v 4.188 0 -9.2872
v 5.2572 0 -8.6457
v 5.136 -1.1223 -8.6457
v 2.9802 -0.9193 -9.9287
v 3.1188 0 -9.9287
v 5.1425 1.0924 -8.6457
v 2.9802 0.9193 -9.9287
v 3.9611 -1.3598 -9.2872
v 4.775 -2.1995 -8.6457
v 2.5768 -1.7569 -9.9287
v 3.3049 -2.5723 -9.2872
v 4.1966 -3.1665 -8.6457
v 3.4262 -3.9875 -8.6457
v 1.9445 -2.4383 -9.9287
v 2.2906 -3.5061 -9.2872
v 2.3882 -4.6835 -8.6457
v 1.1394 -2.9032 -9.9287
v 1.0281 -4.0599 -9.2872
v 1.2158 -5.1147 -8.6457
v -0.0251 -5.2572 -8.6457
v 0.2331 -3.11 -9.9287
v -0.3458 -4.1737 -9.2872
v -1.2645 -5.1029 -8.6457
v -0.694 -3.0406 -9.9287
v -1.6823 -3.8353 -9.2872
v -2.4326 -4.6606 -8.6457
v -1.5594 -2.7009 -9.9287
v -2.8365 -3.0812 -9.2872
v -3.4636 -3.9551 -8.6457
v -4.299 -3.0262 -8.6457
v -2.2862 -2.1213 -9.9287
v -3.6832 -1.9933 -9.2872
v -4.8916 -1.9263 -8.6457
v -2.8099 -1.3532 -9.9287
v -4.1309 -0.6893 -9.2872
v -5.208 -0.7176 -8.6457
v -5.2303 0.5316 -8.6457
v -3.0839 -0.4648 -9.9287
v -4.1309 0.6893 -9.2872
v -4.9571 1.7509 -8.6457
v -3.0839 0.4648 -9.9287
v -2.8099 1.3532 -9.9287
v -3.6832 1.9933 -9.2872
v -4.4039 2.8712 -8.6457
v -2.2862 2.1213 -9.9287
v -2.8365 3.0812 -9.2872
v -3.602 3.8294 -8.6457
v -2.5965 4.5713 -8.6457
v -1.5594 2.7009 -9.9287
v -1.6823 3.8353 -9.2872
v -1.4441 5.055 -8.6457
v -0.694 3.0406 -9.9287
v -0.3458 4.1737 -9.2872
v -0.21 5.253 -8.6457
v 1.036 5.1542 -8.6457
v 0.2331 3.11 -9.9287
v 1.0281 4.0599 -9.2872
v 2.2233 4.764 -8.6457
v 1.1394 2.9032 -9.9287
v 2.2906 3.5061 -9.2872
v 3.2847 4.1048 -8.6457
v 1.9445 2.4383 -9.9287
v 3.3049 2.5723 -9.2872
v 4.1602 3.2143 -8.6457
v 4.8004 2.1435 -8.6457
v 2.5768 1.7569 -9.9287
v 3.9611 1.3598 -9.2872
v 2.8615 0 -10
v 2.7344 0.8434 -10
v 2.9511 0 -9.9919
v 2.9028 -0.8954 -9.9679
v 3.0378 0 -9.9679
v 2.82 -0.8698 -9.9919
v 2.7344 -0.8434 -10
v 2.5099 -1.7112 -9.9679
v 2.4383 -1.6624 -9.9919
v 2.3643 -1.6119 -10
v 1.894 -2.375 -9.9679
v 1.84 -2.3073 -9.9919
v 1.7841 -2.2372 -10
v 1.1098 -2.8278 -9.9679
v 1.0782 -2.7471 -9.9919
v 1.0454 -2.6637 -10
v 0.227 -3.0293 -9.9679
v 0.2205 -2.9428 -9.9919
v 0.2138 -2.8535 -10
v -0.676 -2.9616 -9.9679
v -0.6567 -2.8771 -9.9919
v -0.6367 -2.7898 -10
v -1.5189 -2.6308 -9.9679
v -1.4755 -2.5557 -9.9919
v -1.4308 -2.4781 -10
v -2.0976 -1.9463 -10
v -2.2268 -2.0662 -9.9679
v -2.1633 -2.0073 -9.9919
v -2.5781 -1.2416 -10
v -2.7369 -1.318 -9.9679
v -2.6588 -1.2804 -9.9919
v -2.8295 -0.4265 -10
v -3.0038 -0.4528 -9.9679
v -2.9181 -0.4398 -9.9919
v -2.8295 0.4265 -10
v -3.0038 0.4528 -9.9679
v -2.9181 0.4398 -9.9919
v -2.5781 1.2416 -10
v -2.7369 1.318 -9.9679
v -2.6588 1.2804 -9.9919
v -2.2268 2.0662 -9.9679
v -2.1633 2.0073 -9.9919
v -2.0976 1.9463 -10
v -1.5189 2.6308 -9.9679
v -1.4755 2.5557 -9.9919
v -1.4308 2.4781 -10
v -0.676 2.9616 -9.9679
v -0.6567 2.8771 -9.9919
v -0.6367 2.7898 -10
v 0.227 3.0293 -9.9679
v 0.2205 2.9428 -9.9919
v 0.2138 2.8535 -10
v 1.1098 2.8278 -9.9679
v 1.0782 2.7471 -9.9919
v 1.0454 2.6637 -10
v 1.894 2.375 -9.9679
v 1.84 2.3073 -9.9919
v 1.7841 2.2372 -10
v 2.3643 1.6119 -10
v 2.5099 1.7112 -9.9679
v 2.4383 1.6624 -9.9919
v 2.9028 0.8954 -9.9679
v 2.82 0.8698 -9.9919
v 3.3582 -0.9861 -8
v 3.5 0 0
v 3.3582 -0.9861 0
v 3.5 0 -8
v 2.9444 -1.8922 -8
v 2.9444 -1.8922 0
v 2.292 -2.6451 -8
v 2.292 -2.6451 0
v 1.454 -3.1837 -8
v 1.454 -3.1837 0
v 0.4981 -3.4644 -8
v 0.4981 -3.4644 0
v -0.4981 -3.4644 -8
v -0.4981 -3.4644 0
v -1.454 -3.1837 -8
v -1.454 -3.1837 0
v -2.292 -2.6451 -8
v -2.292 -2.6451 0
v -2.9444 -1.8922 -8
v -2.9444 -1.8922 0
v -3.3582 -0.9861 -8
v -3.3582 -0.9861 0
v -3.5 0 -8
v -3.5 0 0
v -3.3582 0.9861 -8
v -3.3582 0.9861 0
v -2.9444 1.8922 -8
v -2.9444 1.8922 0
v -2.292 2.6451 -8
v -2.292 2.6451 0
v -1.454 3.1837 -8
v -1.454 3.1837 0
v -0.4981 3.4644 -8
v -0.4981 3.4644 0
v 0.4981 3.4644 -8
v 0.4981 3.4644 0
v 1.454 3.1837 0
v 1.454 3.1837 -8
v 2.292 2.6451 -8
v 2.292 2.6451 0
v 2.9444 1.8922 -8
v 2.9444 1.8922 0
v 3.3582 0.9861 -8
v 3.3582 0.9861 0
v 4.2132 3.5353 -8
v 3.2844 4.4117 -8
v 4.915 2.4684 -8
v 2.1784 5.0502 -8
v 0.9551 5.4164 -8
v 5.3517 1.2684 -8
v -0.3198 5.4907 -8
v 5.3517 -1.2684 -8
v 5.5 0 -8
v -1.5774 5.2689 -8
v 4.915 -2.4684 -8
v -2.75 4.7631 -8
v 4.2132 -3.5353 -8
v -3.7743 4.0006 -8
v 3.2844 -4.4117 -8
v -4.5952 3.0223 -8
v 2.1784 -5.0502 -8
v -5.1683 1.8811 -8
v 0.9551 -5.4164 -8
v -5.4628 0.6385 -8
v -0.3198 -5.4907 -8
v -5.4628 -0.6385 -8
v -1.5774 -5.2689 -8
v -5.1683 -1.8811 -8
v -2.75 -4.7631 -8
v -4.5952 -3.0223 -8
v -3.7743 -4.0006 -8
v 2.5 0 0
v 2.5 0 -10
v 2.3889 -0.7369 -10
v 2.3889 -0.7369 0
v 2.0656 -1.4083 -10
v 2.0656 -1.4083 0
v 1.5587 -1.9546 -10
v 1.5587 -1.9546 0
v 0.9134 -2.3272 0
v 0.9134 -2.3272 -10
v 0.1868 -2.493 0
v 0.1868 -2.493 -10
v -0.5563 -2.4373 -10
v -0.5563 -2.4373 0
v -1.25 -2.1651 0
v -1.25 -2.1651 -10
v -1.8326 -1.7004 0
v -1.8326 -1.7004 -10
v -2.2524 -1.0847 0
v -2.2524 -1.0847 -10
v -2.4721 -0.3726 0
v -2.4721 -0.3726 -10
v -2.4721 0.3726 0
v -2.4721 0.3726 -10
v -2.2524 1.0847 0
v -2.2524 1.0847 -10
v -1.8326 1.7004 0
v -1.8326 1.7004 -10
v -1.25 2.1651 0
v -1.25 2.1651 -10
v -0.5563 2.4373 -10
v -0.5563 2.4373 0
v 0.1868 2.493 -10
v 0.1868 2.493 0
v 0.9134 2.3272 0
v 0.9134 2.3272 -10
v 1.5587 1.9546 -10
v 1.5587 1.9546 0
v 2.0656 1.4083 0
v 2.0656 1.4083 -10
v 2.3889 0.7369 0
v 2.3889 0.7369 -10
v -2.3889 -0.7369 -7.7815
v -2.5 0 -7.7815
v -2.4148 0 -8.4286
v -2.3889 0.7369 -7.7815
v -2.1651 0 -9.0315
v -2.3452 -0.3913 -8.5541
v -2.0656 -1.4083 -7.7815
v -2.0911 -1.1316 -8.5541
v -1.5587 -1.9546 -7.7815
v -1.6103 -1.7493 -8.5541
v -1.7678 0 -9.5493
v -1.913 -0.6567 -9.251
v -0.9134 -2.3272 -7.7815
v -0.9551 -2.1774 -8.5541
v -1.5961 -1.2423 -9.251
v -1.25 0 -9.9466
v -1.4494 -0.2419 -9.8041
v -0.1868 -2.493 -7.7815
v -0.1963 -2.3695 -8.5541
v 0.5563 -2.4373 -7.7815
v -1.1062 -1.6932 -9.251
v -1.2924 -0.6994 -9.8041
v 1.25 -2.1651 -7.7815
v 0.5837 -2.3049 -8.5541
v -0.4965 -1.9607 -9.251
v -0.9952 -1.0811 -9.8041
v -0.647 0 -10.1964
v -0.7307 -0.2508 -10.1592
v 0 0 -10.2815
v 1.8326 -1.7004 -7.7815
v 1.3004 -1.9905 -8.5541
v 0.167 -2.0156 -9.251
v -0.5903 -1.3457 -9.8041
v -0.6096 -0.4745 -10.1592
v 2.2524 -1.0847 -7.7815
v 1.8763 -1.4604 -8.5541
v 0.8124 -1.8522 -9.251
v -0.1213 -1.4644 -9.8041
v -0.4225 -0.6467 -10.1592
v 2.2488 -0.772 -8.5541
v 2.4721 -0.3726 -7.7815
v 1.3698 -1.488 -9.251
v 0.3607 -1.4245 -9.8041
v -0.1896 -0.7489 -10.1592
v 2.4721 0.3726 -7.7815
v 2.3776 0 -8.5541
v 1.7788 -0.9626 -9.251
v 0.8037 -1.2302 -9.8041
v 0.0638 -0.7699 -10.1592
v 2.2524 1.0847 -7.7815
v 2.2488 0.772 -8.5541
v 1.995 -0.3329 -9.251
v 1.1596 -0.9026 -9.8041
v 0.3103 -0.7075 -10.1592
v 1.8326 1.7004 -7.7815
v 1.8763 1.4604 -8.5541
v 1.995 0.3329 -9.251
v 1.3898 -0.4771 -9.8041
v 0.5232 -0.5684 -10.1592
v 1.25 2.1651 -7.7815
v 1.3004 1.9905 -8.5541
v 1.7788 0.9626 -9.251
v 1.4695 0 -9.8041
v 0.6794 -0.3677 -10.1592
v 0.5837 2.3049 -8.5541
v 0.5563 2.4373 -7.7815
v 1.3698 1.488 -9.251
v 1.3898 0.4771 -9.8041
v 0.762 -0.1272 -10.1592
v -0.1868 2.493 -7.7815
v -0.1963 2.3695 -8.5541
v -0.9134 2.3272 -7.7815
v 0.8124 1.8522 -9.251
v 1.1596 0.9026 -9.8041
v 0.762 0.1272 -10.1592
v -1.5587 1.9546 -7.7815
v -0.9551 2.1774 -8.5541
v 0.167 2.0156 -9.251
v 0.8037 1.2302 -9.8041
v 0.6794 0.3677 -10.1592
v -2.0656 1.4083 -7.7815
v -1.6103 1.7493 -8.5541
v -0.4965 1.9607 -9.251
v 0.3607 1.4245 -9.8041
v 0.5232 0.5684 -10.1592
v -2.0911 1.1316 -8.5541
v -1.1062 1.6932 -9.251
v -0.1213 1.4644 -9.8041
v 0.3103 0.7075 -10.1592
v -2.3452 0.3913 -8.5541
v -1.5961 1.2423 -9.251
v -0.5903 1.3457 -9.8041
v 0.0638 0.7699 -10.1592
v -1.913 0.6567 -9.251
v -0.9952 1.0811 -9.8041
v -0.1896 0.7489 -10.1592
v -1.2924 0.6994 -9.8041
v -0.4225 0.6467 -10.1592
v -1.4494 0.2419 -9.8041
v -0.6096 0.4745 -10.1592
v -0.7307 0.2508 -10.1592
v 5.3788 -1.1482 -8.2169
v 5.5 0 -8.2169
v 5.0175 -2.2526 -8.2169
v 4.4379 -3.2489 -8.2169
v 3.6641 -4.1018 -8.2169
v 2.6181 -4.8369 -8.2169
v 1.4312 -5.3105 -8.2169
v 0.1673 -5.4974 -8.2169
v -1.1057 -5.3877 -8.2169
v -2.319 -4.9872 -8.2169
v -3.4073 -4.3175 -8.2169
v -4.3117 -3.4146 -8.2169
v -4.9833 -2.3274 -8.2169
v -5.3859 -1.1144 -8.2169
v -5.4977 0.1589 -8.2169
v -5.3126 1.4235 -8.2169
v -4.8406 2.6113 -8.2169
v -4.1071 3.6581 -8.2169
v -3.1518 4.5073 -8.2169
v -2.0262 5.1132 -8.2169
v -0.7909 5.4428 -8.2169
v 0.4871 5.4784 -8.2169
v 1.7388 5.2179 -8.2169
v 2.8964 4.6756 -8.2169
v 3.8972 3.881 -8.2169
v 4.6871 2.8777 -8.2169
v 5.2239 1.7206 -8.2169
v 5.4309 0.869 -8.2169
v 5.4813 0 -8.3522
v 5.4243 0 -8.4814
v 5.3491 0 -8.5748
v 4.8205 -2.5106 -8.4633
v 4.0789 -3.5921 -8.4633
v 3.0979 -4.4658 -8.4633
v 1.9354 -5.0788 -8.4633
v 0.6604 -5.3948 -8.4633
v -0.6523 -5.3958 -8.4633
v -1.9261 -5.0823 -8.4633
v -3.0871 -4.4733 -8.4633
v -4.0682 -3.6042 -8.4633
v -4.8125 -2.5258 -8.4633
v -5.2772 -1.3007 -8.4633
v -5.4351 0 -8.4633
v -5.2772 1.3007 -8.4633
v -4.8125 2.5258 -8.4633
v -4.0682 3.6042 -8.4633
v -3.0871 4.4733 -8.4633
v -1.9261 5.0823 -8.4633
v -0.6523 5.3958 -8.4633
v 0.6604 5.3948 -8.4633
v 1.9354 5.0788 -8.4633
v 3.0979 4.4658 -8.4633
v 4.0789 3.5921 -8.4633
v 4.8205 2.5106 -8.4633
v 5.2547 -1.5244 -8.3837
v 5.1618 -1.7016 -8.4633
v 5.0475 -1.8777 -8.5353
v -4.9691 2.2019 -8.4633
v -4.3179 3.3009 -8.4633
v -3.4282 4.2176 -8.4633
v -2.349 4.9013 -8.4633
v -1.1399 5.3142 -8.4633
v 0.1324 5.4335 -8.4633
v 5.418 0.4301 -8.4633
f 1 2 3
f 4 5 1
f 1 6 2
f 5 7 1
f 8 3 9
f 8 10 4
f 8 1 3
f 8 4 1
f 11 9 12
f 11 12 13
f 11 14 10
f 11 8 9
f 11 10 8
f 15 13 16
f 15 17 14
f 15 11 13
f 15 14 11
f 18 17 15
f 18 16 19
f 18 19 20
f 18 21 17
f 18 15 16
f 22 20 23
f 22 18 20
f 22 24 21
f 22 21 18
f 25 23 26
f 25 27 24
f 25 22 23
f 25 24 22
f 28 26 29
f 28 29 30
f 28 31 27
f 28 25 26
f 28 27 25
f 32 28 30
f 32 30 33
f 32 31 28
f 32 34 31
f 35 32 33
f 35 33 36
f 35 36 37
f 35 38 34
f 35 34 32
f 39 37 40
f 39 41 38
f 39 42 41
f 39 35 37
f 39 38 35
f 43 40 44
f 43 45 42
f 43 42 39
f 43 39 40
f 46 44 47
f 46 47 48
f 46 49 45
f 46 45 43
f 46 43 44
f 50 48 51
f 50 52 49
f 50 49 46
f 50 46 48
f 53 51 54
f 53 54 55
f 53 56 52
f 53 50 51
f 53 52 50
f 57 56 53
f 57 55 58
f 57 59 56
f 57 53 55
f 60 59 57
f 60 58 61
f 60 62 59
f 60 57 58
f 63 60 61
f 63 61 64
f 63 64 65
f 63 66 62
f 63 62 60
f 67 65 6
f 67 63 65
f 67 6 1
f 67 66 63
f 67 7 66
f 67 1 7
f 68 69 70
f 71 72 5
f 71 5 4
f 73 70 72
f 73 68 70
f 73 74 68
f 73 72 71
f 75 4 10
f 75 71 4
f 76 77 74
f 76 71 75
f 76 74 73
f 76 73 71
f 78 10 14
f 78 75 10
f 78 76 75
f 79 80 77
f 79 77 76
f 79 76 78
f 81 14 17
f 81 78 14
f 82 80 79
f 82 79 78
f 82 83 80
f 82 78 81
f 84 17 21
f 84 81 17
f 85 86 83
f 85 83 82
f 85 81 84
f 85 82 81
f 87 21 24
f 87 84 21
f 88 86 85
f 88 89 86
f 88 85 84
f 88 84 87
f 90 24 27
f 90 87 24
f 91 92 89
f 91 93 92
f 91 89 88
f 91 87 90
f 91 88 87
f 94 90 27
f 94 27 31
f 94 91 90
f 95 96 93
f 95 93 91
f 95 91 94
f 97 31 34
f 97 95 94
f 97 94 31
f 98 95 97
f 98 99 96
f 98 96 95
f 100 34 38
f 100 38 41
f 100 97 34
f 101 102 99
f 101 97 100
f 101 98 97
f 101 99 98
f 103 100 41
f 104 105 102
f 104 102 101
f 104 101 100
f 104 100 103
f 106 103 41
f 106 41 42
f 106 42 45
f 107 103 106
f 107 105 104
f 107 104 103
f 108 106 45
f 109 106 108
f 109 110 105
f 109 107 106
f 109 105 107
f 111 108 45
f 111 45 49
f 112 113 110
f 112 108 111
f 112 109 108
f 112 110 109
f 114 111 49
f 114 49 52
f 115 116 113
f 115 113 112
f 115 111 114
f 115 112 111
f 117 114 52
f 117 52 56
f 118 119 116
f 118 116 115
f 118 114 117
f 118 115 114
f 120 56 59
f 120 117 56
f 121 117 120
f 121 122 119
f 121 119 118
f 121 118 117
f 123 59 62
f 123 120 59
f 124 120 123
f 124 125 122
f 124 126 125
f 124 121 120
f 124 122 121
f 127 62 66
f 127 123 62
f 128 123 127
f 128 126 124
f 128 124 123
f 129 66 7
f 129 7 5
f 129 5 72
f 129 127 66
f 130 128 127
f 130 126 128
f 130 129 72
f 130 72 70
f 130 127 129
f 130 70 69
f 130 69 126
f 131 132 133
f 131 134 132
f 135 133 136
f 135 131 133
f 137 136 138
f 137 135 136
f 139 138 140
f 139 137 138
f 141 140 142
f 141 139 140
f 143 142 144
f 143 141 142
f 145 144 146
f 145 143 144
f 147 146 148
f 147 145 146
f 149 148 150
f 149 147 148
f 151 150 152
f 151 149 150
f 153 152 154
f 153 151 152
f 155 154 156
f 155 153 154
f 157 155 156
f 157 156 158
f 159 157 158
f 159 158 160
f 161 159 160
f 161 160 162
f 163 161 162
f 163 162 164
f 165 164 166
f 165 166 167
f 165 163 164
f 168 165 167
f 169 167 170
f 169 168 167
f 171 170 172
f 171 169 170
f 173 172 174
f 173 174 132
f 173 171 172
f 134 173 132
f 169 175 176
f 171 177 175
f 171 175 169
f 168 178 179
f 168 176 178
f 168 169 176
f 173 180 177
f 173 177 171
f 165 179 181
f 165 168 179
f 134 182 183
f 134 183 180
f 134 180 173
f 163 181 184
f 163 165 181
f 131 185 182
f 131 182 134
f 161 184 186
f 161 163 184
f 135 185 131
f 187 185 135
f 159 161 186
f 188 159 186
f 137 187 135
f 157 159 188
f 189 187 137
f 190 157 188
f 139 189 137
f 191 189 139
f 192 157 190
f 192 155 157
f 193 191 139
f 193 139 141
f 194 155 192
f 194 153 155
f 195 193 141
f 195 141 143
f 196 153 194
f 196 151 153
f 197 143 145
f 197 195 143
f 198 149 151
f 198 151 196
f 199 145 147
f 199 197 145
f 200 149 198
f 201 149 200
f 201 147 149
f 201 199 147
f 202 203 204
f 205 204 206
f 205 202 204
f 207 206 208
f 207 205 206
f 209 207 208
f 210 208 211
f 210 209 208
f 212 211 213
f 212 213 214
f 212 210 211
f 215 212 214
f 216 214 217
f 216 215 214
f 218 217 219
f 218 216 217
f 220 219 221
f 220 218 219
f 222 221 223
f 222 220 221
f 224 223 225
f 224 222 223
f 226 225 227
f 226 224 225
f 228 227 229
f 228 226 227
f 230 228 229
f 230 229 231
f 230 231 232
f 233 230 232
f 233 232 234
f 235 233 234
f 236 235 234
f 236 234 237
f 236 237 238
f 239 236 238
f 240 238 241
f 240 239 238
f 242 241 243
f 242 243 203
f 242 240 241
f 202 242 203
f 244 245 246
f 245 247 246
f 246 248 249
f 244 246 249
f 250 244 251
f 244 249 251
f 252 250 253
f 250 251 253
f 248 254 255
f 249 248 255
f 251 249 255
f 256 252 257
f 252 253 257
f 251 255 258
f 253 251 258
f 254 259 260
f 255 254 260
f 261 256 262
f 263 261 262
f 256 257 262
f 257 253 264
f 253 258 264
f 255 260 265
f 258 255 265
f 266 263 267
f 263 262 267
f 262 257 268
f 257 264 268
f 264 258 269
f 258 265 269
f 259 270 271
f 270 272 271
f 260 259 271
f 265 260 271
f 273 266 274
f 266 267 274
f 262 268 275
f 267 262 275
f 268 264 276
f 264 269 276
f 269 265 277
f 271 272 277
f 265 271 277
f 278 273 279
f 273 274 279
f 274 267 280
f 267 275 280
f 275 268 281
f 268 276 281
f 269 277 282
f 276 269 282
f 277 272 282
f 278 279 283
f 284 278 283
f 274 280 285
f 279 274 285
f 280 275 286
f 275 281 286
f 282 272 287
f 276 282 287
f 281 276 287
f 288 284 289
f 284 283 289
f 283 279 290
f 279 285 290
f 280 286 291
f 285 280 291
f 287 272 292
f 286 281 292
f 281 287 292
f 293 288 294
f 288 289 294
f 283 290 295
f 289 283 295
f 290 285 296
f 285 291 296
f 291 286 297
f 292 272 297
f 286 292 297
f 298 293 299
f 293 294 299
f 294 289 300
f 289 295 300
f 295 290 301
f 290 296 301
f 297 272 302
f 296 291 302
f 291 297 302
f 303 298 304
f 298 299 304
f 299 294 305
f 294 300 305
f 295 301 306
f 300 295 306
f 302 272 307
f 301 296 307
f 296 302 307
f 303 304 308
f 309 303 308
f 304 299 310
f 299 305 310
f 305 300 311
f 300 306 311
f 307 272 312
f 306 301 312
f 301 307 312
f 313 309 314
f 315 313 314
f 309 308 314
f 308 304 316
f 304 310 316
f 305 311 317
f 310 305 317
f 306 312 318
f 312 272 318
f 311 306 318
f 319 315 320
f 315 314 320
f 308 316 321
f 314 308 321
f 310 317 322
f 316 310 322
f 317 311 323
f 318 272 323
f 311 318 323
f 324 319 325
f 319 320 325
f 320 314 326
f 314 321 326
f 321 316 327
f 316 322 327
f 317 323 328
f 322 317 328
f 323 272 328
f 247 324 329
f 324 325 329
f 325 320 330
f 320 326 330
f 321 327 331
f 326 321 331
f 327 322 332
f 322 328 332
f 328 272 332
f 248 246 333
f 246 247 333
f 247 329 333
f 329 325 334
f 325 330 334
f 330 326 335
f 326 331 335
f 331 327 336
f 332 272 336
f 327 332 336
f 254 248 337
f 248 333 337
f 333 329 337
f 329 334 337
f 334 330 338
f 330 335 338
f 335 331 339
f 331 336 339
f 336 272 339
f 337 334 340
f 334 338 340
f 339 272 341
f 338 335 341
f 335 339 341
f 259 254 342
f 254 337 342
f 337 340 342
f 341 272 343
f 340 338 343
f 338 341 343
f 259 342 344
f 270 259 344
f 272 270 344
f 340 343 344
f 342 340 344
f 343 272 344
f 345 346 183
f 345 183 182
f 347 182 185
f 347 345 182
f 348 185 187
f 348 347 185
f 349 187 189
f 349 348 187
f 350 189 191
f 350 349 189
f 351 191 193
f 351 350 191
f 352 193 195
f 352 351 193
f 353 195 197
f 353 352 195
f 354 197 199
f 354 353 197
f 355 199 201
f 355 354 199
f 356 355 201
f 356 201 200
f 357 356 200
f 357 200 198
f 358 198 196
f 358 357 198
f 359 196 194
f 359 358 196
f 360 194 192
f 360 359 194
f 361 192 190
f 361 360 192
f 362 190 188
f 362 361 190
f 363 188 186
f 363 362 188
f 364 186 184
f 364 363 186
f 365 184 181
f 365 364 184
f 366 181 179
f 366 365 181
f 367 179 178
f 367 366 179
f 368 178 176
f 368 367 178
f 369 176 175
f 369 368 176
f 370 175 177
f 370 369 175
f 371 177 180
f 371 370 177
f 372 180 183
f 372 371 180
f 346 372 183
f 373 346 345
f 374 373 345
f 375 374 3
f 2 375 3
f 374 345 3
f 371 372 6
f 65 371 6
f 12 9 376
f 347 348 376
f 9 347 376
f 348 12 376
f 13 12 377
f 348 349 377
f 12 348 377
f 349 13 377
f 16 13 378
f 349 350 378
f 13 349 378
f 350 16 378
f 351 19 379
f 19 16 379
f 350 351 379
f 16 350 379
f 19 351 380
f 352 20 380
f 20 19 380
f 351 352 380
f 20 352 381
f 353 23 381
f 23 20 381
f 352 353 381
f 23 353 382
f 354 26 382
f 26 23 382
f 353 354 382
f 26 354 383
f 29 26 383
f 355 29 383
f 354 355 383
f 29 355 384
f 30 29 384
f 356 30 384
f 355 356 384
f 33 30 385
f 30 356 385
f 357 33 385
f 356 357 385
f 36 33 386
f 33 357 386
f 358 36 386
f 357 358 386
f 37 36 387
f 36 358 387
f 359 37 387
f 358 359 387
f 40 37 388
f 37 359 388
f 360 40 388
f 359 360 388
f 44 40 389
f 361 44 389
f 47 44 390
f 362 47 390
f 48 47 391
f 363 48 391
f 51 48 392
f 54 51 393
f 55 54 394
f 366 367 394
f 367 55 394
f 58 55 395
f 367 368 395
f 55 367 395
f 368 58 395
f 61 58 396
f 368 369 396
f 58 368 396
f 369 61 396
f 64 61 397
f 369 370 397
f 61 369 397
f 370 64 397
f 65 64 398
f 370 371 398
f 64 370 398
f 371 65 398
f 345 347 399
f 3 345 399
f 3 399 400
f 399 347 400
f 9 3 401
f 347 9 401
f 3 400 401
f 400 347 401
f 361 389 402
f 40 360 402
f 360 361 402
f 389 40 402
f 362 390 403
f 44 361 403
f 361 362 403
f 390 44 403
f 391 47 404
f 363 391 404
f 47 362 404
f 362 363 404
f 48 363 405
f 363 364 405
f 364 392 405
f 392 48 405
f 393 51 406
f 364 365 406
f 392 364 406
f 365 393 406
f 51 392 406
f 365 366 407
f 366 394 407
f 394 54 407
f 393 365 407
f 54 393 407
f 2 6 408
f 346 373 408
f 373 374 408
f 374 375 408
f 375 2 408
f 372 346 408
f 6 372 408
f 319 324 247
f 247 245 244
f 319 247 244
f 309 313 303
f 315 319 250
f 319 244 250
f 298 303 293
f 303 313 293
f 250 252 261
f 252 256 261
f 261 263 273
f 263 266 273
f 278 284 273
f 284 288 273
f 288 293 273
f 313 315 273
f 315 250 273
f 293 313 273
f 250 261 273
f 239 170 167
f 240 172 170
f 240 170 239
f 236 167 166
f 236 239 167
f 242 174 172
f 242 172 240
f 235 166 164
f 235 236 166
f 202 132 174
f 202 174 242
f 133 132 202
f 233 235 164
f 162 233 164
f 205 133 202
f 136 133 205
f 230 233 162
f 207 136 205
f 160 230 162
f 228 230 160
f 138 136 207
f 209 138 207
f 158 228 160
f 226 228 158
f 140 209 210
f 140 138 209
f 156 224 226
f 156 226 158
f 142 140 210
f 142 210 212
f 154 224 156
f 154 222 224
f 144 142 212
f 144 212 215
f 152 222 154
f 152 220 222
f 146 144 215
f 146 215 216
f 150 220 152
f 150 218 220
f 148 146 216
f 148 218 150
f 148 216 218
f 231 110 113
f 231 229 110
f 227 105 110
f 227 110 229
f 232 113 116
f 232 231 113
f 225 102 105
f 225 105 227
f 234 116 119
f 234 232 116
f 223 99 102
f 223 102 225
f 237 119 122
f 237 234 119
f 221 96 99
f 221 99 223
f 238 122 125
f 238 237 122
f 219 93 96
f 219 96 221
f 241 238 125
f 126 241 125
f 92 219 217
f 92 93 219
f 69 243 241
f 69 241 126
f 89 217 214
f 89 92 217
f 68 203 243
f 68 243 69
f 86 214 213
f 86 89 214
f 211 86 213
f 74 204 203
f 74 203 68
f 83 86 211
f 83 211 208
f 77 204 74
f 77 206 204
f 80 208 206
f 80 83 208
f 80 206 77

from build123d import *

# Parameters (mm, degrees)
FILLET1_R = 0.5


with BuildPart() as part:
    # Sketch2 → Revolve1 (revolve)
    with BuildSketch(Plane(origin=(0, 0, 0), x_dir=(1, 0, 0), z_dir=(0, 1, 0))):
        Polygon((2.5, 0), (3.5, 0), (3.5, 8), (5.5, 8), (5.5, 8.5), (3, 10), (2.5, 10), align=None)
    revolve(axis=Axis((0, 0, 0), (0, 0, -1)))

    # Fillet1
    fillet1_edges = [part.edges().sort_by_distance(p)[0] for p in [
        (-5.5, 0, -8.5),
        (-3, 0, -10),
    ]]
    fillet(fillet1_edges, radius=FILLET1_R)


with BuildPart() as body_2:
    # Sketch4 → Revolve2 (revolve)
    with BuildSketch(Plane(origin=(0, 0, 0), x_dir=(1, 0, 0), z_dir=(0, 1, 0)), mode=Mode.PRIVATE) as revolve2_sk:
        with BuildLine():
            Line((0, 7.781542094), (2.5, 7.781542094))
            ThreePointArc((2.5, 7.781542094), (1.767766953, 9.549309047), (0, 10.281542094))
            Line((0, 10.281542094), (0, 7.781542094))
        make_face()
    revolve(revolve2_sk.sketch.rotate(Axis((0, 0, -10.281542094), (0, 0, 1)), 180), axis=Axis((0, 0, -10.281542094), (0, 0, 1)))


solid = Compound([part.part, body_2.part])
